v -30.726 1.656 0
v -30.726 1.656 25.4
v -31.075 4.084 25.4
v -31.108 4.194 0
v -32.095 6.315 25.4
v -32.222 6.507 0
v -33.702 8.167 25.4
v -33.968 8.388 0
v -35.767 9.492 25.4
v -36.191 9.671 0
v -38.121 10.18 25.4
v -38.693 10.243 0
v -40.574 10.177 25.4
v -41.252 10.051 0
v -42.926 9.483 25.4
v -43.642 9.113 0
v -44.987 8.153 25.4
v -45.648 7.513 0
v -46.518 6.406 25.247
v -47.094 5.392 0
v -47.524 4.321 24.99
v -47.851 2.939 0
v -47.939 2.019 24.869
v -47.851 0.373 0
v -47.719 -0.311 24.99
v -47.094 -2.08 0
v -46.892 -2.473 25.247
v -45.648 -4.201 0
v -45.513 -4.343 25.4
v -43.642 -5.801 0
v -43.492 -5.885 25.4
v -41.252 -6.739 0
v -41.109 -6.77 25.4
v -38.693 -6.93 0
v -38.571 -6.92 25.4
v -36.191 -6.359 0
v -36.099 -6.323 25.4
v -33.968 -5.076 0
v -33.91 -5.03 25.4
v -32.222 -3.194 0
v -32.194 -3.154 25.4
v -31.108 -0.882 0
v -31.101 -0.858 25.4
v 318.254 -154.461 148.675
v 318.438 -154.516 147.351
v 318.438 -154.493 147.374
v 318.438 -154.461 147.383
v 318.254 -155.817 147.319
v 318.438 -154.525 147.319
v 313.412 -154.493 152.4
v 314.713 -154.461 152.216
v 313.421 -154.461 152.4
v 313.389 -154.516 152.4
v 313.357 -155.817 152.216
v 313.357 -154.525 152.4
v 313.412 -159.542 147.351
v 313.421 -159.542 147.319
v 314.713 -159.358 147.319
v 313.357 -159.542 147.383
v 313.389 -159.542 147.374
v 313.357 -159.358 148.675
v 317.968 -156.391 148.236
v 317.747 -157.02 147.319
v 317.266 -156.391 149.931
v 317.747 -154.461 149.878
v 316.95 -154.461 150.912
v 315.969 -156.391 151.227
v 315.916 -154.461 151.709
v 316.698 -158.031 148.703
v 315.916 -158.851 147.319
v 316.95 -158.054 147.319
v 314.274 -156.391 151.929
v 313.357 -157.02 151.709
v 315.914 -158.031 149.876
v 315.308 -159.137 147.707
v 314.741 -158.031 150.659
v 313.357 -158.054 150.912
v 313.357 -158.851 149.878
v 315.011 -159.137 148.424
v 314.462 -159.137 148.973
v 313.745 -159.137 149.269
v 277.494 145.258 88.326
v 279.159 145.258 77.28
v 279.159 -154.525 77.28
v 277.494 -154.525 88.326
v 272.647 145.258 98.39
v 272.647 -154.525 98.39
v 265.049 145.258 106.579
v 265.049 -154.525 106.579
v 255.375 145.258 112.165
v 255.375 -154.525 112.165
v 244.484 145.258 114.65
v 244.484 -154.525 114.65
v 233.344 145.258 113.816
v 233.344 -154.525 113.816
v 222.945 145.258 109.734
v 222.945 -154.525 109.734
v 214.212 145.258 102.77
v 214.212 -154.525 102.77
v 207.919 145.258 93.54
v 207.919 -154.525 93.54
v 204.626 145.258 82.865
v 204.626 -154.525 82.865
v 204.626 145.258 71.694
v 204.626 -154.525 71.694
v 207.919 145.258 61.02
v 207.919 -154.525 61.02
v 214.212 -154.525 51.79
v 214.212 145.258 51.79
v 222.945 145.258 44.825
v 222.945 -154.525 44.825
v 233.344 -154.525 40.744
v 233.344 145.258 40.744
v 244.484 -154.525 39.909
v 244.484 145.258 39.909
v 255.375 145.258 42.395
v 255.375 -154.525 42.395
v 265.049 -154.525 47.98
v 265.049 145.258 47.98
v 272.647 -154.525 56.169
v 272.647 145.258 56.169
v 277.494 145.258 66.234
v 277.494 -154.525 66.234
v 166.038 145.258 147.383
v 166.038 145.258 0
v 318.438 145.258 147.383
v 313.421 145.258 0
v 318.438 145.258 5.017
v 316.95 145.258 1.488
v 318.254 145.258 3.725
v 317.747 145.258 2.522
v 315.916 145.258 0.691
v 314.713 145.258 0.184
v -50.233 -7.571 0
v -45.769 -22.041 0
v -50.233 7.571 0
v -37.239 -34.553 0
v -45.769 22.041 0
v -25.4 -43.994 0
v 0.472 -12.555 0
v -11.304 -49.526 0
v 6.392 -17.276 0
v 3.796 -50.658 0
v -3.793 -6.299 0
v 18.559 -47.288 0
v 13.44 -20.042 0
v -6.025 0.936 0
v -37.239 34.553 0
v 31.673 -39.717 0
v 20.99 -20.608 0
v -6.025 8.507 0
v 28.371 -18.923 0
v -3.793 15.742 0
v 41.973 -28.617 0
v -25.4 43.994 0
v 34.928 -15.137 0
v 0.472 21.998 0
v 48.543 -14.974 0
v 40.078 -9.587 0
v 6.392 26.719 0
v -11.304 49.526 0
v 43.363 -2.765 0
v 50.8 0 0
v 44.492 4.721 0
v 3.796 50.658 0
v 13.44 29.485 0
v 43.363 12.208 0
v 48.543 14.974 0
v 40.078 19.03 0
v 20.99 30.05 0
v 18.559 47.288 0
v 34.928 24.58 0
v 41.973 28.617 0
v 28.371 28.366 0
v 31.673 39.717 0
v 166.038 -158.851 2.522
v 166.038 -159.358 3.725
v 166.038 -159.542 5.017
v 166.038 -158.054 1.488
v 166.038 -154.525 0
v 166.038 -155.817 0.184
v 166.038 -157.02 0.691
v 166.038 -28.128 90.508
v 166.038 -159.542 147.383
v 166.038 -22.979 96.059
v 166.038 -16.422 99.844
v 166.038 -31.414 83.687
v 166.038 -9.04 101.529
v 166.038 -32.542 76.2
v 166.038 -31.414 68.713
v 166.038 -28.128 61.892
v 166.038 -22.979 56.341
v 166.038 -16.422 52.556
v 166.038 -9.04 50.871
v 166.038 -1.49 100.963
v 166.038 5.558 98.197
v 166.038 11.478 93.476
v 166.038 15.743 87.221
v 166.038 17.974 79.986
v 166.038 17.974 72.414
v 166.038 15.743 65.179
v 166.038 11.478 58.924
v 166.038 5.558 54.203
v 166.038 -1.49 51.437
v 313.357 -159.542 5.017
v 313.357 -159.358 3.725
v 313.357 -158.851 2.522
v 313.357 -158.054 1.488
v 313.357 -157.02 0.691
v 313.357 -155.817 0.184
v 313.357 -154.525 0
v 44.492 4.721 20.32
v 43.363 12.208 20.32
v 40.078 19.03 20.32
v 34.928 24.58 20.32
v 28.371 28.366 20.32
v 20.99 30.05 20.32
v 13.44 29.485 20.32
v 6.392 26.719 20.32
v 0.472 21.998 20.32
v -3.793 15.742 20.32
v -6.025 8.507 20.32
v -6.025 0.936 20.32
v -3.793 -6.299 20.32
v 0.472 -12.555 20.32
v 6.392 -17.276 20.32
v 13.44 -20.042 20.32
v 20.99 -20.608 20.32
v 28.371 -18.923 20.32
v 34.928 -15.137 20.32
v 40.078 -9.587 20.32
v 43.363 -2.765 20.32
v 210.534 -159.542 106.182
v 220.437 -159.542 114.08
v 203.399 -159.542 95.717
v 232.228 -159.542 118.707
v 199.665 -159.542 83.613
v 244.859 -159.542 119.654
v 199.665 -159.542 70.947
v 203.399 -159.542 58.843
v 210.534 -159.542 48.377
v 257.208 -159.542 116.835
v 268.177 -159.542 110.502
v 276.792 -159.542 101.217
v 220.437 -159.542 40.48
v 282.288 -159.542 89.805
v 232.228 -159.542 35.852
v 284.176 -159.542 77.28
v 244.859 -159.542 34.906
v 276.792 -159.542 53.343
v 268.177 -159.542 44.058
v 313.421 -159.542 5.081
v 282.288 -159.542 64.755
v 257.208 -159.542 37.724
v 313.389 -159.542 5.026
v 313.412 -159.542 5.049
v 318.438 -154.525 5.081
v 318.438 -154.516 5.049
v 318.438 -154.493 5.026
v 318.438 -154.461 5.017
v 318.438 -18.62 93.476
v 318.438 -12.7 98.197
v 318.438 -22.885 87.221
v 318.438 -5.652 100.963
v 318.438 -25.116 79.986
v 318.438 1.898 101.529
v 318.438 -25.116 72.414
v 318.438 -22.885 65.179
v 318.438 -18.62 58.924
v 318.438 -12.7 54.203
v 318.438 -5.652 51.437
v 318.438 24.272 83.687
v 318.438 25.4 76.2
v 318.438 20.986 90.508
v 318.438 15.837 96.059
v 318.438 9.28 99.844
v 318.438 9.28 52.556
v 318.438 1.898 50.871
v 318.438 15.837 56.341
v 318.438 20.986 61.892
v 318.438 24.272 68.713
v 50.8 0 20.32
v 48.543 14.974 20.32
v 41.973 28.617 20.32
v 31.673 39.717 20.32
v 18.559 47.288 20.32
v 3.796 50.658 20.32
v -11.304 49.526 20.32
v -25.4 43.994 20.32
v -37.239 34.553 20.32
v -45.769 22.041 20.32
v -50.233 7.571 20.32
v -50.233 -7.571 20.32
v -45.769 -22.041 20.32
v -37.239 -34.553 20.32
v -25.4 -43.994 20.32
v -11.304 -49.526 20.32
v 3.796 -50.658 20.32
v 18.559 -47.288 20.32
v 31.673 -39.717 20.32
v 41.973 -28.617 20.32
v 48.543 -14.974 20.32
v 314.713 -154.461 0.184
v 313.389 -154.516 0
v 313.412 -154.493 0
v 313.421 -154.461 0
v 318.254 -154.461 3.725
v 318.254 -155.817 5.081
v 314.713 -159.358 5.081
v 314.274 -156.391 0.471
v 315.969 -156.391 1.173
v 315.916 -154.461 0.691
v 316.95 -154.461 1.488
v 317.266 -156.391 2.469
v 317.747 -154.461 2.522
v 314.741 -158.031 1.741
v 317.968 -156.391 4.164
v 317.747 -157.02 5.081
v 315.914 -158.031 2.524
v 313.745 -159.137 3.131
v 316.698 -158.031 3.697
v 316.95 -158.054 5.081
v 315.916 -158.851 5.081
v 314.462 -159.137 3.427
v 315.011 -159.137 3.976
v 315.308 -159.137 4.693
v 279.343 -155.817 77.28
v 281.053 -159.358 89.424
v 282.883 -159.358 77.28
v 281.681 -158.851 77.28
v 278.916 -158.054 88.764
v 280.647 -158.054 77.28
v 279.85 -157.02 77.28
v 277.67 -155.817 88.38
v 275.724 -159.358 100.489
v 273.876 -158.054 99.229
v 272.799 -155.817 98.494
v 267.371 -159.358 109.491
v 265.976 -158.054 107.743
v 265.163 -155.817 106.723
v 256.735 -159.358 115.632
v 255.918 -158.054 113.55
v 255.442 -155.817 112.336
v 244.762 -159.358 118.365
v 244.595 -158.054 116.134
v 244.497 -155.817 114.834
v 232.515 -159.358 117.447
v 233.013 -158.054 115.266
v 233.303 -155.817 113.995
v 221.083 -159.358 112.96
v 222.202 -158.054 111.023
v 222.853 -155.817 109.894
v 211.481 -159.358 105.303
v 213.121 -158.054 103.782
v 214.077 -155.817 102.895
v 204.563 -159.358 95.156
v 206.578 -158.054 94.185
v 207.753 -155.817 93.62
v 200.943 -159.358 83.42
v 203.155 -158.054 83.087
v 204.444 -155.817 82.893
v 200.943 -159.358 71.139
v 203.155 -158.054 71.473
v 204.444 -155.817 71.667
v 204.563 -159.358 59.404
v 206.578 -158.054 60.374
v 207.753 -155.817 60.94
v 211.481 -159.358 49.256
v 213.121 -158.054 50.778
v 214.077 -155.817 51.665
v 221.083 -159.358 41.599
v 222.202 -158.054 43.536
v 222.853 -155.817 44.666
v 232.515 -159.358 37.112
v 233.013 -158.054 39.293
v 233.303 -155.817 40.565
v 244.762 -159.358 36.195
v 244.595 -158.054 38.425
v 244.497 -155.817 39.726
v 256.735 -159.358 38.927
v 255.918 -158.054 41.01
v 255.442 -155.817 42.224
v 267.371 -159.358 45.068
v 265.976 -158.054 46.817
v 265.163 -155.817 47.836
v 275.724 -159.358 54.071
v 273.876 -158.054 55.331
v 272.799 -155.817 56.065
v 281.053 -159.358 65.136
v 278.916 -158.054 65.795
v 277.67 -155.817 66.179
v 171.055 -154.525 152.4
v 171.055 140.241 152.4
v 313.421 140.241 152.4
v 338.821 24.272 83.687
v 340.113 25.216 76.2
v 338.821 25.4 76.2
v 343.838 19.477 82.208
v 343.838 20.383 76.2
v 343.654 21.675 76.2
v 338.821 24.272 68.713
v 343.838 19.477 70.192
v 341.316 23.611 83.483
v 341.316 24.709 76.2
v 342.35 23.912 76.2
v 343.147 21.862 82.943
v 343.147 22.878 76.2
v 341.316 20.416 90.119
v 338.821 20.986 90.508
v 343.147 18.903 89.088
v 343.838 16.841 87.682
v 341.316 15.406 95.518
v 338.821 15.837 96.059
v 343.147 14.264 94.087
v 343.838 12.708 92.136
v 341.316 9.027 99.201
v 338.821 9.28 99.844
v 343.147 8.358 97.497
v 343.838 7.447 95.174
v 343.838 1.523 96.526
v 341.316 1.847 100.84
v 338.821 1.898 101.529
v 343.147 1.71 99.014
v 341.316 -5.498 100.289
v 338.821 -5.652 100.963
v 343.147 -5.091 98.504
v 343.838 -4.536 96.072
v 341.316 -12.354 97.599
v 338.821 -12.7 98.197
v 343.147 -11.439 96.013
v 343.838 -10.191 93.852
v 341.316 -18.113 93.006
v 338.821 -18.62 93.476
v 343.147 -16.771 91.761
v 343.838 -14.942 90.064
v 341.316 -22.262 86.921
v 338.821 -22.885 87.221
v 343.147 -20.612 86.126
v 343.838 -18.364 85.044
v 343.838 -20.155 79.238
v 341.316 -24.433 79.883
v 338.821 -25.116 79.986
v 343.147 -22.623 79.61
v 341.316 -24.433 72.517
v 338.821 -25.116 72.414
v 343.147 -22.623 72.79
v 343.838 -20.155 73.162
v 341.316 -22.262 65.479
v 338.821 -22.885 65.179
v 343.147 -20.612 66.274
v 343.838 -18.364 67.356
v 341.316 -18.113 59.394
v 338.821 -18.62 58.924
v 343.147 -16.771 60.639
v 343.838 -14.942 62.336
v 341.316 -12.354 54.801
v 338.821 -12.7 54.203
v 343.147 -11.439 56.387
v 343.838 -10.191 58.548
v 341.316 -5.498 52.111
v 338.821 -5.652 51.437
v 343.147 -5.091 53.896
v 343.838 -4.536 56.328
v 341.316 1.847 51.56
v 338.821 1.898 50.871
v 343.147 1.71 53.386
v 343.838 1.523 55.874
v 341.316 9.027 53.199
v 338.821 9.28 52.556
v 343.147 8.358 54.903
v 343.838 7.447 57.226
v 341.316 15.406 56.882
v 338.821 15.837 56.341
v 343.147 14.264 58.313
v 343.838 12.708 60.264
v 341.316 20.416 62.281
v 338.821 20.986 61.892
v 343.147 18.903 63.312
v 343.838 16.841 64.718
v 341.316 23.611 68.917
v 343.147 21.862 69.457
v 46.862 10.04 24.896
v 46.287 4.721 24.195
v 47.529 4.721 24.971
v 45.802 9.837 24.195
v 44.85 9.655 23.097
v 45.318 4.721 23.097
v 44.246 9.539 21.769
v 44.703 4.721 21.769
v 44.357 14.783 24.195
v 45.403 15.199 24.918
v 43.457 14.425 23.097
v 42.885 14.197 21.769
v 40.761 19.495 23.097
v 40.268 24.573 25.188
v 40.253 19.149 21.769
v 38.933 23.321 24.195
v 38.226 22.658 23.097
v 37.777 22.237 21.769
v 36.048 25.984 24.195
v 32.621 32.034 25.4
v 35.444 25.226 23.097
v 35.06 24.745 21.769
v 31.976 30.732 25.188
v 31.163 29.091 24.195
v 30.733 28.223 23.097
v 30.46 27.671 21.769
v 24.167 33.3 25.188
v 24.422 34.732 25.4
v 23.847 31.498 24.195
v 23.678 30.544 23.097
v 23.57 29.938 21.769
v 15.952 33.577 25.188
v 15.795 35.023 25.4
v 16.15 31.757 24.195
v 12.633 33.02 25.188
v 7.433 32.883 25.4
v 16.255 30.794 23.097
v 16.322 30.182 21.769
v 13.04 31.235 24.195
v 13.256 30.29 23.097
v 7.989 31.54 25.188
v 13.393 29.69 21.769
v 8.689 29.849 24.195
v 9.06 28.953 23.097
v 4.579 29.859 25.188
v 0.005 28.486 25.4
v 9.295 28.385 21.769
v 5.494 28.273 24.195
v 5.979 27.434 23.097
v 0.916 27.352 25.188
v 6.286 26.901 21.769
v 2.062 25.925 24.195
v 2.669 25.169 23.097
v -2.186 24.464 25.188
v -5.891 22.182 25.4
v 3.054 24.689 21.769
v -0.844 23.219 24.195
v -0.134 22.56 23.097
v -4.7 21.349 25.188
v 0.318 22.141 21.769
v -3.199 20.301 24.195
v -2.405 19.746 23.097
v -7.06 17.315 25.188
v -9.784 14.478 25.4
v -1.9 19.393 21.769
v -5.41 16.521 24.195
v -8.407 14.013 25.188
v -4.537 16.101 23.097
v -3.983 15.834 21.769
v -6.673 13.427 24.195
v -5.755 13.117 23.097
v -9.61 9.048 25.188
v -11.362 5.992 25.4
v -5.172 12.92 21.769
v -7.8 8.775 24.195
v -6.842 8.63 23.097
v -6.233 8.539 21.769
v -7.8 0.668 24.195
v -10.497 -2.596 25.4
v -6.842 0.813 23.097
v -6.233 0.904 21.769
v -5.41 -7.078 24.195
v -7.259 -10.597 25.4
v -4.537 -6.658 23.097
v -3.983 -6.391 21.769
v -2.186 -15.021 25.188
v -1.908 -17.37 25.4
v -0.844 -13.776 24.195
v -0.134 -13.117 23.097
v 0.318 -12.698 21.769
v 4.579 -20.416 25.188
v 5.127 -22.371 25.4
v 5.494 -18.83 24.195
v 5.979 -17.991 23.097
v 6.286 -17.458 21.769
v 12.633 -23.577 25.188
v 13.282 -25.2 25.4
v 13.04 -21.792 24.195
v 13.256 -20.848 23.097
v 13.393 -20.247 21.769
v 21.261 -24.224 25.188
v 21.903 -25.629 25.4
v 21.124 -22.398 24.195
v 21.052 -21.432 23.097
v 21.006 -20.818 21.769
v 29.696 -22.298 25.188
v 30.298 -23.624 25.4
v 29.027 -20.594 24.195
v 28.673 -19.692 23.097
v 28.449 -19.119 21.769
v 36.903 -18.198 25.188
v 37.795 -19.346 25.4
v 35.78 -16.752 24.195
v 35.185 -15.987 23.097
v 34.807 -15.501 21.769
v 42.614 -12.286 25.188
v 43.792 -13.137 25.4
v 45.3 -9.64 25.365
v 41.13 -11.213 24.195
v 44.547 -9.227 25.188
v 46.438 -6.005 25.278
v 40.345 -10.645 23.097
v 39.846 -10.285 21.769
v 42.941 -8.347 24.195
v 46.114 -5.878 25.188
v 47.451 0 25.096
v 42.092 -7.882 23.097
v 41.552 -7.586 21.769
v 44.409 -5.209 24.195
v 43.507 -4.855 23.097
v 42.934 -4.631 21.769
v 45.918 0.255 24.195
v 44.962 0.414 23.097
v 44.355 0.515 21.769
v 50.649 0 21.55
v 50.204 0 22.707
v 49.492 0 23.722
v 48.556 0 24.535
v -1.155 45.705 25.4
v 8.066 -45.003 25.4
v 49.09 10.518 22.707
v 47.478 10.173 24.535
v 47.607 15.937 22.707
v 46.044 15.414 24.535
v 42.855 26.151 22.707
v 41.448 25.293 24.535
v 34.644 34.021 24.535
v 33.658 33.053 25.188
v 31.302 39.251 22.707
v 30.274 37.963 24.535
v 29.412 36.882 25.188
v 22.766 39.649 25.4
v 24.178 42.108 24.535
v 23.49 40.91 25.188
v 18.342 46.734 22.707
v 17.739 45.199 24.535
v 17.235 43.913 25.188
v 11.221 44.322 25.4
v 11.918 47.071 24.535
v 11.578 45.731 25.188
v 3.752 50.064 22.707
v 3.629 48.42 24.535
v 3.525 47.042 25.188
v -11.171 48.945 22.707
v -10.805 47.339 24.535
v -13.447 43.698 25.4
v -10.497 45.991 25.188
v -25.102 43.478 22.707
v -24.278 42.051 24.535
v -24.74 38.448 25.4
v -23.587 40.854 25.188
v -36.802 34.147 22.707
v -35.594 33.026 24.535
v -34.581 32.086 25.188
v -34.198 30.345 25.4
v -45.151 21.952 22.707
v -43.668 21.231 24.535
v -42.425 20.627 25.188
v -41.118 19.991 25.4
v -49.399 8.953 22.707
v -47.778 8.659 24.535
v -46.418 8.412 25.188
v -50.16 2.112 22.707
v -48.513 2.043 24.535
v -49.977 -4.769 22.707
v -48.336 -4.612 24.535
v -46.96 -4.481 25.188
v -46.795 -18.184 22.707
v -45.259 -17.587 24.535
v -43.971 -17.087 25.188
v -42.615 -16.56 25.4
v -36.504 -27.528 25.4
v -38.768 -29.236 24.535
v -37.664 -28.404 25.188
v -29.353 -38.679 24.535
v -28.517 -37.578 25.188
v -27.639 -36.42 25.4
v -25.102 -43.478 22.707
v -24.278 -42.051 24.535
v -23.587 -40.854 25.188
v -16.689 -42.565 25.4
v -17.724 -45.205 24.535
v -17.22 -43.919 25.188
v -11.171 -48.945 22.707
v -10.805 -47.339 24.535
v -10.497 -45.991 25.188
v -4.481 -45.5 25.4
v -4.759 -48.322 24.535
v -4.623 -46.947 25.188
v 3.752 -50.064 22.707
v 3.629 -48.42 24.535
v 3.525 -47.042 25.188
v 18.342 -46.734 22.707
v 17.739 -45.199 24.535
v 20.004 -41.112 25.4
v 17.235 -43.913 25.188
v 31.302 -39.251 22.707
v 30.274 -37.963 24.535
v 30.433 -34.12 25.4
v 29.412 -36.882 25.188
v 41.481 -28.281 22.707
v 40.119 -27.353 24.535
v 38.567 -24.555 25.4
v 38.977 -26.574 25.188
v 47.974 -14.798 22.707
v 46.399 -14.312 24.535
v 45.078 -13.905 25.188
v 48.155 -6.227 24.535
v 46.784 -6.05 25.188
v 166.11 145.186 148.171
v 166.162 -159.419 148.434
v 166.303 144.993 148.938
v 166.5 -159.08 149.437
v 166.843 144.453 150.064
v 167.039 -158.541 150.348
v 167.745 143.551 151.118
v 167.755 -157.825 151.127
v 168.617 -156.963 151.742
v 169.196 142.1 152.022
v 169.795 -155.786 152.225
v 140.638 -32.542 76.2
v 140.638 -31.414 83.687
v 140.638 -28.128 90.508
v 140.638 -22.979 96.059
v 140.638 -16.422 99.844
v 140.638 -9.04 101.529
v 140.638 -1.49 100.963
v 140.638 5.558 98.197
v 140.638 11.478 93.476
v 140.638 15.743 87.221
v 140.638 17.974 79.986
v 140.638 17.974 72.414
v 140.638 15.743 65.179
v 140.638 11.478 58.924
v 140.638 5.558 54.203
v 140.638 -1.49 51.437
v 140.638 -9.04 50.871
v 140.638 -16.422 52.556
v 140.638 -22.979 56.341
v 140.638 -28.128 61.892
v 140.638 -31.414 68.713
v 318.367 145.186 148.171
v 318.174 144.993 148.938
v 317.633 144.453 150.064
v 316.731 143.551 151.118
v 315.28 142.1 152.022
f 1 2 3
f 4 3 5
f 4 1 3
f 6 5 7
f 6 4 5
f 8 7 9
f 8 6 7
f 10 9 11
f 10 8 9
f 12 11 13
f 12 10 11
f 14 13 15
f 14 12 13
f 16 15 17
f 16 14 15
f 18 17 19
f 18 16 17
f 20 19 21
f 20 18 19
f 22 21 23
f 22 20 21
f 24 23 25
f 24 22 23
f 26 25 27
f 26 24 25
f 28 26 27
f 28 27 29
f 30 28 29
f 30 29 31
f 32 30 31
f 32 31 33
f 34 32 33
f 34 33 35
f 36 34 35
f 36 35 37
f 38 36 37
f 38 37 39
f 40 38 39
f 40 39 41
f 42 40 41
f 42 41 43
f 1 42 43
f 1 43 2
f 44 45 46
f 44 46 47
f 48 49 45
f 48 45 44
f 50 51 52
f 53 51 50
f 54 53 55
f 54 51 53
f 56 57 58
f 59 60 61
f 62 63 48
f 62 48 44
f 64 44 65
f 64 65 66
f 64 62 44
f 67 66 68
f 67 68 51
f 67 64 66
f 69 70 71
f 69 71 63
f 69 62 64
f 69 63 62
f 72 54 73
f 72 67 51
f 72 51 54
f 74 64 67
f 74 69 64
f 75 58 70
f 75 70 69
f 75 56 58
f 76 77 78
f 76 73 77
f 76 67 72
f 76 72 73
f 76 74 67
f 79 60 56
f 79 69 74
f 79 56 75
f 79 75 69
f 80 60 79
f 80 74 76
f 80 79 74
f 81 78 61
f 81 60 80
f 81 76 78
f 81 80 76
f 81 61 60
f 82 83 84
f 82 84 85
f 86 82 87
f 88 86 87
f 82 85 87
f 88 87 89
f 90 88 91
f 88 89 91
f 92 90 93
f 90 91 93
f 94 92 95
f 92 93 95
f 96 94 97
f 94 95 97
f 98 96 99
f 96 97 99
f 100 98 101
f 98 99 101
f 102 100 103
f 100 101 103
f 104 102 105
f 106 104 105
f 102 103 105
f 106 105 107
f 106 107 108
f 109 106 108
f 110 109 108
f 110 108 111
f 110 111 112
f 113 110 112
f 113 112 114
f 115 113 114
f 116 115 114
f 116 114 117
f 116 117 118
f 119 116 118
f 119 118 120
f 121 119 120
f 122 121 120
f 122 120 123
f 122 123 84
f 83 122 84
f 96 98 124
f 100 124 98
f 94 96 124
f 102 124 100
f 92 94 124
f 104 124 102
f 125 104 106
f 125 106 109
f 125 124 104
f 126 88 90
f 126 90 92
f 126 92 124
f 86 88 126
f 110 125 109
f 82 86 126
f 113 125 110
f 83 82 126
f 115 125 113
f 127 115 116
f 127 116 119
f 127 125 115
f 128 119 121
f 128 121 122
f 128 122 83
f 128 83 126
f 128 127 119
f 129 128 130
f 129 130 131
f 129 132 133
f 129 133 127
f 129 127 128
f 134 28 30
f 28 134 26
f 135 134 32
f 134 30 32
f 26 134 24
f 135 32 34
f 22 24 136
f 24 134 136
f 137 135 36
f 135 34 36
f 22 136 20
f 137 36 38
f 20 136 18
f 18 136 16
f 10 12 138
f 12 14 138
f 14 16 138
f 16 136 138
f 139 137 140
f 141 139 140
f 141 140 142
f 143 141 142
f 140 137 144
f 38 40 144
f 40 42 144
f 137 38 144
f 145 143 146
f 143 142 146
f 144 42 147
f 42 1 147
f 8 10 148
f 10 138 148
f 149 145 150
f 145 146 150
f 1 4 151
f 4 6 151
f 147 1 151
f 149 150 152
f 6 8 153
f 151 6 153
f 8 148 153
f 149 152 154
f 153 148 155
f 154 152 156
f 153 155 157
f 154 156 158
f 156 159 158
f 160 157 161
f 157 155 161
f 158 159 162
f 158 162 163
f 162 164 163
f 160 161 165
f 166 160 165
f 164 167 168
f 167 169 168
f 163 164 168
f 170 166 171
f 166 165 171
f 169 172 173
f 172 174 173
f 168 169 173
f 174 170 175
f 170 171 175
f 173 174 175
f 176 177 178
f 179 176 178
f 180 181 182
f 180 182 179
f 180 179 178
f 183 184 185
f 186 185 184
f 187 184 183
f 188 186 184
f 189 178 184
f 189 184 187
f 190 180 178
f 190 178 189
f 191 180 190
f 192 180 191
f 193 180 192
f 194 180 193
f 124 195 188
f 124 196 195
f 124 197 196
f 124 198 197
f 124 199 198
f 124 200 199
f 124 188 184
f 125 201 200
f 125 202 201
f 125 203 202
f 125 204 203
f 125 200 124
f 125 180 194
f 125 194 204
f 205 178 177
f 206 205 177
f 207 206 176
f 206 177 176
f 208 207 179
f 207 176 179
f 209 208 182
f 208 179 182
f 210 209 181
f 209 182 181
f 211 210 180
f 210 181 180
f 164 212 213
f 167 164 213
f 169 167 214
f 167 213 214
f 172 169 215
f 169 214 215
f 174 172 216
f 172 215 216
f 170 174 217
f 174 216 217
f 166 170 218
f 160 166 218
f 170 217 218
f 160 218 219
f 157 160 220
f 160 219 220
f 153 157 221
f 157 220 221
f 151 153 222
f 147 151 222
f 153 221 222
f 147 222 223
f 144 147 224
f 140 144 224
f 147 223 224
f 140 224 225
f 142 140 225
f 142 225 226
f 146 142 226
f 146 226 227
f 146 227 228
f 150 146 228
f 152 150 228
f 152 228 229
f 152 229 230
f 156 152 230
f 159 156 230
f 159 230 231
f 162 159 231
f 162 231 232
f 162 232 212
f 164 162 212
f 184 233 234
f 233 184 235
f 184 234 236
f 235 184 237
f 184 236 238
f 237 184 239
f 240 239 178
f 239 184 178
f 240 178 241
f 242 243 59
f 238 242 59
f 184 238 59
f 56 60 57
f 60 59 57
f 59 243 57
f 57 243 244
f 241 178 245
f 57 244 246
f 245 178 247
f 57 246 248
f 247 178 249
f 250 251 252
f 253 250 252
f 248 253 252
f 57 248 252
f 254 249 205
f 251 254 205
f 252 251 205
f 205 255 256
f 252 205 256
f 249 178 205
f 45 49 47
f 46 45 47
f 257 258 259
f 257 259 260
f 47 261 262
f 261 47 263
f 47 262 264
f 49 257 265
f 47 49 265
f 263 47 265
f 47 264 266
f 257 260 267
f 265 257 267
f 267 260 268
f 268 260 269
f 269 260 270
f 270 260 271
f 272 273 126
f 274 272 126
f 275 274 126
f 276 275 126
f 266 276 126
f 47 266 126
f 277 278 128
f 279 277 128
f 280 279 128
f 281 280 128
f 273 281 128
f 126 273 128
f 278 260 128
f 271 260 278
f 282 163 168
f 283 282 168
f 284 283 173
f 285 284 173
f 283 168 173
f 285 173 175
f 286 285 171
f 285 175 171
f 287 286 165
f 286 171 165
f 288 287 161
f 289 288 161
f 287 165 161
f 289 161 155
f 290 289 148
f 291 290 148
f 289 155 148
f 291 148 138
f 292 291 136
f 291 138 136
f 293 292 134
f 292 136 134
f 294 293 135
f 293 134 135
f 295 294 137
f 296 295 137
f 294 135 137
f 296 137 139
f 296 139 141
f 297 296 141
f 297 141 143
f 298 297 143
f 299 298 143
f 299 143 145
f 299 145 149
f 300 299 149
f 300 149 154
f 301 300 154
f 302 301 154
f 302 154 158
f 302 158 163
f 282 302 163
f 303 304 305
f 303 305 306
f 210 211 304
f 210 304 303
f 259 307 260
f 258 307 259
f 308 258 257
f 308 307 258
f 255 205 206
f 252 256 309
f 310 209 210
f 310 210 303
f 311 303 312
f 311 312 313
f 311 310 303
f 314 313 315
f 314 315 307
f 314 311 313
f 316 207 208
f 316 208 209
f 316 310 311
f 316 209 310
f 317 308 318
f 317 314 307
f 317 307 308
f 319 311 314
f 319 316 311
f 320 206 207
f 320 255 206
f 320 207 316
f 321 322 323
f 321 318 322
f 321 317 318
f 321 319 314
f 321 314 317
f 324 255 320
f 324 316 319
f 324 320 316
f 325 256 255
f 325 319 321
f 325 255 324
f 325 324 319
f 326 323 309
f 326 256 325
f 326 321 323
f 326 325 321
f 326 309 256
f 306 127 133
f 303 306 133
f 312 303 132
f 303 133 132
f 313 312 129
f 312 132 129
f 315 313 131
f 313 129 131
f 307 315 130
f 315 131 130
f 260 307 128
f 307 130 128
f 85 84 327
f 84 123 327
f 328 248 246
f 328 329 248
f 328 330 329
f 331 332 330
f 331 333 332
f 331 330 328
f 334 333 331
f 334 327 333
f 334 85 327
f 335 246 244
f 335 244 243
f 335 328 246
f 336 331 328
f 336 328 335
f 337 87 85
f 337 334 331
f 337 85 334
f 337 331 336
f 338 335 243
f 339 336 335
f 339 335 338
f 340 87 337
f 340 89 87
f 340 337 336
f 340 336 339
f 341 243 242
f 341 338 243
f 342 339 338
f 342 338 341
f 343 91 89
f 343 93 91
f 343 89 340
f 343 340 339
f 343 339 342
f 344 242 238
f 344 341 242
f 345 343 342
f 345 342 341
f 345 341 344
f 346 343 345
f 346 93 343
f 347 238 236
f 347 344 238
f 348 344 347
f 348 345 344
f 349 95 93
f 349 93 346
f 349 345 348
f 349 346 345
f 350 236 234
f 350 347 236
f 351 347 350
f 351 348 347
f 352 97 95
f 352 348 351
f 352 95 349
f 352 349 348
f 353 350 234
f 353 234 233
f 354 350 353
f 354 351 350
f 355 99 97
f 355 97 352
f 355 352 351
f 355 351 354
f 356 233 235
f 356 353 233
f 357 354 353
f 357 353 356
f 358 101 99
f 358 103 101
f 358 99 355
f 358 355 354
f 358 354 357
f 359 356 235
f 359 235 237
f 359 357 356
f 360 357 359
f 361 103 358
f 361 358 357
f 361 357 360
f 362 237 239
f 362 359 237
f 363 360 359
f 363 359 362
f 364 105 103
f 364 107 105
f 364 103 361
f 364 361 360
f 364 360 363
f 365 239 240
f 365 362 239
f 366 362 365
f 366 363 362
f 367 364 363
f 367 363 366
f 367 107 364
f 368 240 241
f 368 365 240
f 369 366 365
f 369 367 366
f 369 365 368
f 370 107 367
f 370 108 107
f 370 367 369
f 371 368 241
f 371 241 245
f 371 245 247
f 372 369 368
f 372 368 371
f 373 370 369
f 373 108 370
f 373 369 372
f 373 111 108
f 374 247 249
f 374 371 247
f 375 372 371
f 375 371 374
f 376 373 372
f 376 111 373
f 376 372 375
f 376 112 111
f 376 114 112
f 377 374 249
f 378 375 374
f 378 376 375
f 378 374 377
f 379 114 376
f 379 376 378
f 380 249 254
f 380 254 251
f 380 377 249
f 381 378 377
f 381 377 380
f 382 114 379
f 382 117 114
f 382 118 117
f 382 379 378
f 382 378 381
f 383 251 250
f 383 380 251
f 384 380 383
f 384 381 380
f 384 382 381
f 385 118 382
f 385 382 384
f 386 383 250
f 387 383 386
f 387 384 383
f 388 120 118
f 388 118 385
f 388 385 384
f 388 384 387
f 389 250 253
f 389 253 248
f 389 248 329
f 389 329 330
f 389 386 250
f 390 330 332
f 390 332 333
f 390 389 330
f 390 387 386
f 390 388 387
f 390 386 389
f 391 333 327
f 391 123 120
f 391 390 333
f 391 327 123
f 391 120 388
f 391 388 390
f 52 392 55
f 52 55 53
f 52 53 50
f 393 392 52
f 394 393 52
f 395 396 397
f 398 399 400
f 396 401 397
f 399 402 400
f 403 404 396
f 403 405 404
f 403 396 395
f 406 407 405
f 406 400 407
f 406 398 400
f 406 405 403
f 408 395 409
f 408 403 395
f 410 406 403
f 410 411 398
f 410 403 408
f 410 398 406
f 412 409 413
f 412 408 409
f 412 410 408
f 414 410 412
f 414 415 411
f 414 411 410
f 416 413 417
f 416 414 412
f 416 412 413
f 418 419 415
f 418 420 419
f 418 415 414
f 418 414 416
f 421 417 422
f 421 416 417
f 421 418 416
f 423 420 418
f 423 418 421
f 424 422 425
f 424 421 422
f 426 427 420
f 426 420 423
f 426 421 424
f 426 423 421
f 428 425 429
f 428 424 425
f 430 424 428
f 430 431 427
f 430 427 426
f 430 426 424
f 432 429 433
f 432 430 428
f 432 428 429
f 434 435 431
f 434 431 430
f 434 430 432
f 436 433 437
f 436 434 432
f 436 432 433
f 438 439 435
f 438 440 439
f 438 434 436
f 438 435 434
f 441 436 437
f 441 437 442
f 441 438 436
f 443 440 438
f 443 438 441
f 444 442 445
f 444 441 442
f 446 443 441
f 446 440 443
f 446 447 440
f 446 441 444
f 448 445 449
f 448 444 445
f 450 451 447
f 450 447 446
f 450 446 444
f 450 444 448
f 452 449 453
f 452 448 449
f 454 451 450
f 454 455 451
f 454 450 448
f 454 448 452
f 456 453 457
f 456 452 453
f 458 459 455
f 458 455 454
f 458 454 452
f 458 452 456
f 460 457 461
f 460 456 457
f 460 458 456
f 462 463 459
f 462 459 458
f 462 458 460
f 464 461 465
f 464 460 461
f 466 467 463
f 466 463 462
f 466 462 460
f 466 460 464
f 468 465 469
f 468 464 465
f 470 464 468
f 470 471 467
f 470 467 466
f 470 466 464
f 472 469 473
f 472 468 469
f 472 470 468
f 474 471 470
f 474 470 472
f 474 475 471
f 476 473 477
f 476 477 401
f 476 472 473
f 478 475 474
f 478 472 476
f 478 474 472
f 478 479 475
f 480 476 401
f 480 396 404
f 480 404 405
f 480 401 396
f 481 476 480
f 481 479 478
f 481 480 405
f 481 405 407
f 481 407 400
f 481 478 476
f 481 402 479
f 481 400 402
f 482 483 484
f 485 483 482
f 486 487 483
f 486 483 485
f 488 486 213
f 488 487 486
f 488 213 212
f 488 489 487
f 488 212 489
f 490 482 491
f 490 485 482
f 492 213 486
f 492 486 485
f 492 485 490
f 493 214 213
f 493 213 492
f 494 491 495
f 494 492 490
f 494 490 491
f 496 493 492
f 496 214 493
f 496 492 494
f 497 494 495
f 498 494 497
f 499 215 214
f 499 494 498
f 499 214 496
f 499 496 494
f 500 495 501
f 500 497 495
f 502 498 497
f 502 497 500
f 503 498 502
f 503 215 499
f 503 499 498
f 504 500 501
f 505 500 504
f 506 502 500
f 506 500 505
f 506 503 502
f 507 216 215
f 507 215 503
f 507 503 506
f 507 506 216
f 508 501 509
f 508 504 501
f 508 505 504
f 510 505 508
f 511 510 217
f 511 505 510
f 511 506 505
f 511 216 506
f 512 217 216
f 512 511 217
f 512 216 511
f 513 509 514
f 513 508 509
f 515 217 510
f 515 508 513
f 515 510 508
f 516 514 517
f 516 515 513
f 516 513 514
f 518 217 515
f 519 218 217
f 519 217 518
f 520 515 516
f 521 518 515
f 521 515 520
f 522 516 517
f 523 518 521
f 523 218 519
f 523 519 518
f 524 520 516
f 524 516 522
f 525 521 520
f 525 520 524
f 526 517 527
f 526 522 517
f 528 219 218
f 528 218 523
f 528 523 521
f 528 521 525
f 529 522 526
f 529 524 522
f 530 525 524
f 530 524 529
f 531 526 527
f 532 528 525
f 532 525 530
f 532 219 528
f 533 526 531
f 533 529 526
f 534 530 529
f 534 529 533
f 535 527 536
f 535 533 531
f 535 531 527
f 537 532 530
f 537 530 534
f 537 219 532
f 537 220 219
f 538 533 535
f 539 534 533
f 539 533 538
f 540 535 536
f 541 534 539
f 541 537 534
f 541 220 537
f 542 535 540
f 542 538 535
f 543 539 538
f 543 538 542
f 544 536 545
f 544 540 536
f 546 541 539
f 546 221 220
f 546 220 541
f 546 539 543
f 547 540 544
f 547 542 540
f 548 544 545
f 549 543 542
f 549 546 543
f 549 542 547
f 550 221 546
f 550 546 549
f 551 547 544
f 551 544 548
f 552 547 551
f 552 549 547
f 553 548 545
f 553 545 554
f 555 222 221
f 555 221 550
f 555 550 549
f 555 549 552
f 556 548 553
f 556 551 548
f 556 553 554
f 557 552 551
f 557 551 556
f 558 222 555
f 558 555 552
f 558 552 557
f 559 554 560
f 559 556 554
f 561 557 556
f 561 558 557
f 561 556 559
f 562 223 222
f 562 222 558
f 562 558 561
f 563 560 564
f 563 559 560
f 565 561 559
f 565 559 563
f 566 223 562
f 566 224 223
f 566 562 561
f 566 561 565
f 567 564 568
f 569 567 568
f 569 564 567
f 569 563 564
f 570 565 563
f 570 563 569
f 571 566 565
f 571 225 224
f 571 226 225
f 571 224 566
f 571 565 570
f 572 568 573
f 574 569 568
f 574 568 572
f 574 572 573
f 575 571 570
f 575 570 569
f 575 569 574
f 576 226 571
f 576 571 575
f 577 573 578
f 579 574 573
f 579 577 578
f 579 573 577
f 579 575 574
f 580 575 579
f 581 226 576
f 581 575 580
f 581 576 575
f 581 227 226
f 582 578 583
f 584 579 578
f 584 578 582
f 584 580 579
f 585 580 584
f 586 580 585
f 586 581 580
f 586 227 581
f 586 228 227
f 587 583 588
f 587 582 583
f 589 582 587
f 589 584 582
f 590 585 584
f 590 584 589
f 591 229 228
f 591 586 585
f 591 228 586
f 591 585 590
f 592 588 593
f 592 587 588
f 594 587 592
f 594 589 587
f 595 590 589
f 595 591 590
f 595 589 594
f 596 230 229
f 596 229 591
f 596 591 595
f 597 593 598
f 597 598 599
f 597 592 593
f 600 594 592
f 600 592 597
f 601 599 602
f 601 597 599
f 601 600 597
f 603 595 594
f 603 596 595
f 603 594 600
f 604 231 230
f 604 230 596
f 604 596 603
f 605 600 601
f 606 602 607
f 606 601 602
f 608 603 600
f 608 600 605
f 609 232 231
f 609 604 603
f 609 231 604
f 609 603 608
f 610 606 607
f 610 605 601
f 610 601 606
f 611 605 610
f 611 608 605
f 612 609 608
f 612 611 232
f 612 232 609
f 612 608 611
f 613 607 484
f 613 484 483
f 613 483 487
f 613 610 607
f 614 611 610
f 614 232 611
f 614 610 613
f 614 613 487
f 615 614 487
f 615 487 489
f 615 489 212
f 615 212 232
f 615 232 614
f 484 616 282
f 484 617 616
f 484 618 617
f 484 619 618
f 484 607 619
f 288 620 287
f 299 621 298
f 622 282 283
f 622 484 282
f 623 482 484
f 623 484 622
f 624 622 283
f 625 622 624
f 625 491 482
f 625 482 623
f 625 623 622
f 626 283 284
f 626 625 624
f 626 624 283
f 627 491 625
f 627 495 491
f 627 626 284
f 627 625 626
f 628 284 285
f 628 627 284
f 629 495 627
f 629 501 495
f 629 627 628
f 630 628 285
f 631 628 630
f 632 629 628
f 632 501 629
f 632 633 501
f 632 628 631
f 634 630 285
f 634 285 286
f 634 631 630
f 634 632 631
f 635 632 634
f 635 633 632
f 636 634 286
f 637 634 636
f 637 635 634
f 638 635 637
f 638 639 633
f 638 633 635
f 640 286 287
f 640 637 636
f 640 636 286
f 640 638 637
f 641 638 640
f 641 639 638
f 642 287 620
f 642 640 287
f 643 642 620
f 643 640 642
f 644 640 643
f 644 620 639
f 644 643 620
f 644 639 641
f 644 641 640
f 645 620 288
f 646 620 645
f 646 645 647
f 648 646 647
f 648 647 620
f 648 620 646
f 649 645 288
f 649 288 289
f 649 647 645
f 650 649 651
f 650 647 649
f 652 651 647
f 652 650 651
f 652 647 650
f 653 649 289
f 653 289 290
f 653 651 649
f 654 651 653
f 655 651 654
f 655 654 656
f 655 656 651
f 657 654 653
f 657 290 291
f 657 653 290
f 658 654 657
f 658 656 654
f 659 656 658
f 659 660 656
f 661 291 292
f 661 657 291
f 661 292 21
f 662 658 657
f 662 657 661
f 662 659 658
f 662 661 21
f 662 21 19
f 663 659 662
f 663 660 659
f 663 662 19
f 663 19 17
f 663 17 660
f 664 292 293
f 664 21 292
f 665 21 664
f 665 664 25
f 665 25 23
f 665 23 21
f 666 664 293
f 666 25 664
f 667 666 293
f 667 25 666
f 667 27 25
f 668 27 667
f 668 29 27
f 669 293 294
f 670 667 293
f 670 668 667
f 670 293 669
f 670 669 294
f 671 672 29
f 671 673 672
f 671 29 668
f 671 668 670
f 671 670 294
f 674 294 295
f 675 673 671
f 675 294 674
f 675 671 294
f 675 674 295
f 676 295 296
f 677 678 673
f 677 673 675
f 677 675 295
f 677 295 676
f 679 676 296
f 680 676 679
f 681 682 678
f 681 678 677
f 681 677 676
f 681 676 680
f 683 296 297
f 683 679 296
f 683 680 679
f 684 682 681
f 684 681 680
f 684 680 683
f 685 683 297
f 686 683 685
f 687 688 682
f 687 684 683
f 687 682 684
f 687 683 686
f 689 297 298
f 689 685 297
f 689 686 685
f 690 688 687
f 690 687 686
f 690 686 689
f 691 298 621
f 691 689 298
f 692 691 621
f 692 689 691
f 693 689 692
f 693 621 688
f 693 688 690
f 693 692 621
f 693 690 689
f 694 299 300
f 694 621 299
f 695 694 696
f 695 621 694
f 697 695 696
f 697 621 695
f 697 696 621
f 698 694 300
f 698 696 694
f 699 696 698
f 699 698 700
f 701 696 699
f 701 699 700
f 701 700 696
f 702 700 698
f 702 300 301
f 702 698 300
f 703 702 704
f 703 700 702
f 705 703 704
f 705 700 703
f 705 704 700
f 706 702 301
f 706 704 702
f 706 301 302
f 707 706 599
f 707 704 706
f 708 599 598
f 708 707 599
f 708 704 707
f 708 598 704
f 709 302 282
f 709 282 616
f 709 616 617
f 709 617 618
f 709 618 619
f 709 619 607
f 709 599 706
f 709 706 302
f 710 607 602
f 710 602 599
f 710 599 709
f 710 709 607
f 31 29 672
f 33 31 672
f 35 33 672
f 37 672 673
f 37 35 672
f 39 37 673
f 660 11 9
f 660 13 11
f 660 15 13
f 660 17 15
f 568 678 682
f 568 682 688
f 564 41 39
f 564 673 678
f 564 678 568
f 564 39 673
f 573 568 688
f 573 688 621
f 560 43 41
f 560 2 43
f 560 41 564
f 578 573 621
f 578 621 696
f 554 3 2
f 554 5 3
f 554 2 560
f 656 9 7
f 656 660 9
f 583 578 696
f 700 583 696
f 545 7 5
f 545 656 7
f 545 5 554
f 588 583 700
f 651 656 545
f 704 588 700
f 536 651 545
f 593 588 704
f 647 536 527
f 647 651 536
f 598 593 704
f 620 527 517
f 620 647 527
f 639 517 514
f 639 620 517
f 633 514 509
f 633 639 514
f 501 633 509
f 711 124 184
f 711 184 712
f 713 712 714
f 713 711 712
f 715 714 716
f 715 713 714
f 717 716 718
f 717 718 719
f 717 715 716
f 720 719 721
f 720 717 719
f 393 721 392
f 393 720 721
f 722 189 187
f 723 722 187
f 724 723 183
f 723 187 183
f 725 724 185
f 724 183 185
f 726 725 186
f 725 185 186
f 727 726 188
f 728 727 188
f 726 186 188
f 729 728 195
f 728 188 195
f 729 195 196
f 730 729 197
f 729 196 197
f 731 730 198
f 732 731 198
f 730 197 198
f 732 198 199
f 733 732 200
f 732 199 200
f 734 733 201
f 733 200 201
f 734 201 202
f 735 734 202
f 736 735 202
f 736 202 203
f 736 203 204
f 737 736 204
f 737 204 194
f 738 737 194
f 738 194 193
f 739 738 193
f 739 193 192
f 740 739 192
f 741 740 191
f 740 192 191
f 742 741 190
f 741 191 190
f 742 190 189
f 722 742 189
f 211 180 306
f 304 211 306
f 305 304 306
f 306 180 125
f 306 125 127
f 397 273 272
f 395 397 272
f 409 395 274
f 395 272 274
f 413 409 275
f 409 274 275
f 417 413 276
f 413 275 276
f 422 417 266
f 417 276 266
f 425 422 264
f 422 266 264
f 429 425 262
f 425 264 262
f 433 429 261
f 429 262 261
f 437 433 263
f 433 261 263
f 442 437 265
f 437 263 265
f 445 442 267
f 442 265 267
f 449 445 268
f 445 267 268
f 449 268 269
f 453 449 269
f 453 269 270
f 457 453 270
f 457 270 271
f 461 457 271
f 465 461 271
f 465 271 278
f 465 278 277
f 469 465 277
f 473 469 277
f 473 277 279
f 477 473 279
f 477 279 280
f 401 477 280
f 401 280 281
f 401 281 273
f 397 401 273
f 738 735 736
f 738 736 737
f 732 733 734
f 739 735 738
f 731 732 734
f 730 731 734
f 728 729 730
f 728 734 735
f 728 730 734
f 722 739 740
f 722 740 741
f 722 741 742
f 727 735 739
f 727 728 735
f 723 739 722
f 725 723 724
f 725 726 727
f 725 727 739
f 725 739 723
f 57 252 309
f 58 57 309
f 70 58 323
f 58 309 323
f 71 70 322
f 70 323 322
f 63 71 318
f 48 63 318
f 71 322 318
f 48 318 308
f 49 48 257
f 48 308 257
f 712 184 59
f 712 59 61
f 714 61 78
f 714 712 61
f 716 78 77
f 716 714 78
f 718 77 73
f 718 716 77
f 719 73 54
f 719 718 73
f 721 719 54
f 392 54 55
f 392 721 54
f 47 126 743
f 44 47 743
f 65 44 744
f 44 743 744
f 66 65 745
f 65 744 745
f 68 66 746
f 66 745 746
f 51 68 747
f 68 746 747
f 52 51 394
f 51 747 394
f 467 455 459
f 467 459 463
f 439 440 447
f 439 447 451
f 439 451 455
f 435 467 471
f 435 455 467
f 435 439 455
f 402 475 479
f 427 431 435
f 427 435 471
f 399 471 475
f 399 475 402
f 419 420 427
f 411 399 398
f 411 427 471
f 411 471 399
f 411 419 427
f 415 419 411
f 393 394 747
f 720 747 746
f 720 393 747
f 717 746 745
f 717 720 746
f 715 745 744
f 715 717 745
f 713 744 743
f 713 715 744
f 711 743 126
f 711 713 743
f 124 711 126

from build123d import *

# Parameters (mm, degrees)
F0_R            = 50.8
F0_R_2          = 8.6106
F1_DEPTH        = 25.4
F2_W            = 152.4
F2_H            = 304.8
F3_DEPTH        = 152.4
F5_DEPTH        = 304.8
F6_R            = 25.4
F7_DEPTH        = 25.4
F8_R            = 25.4
F9_DEPTH        = 25.4
F10_R           = 37.4754940494
F11_DEPTH       = 1270
F12_DEPTH       = 25.4
F13_DEPTH       = 25.4
F14_R           = 25.4
F15_DEPTH       = 25.4
F16_2_T1_DEPTH  = 160.0214485675
F16_2_T3_DEPTH  = 177.8048285058
F16_2_T5_DEPTH  = 330.2048285058
F16_2_T7_DEPTH  = 312.4214485675
F16_2_T9_DEPTH  = 142.2380686292
F16_2_S13_W     = 5.5895022539
F16_2_S13_H     = 5.5895022539
F16_2_T14_DEPTH = 5.589502254
F16_2_S19_W     = 5.5895022539
F16_2_S19_H     = 5.5895022539
F16_2_T20_DEPTH = 5.589502254


# Not quite as in the source:
# - a fillet or chamfer that OpenCascade refuses, or shapes differently, is made with other operations: its cross-section is extruded or revolved along the edge and cut away or added


with BuildPart() as f1:
    # F0 (on Top) → F1 (new body)
    with BuildSketch(Plane.XY):
        Circle(F0_R)
        with Locations((-39.3364430946, 1.6560875433)):
            Circle(F0_R_2, mode=Mode.SUBTRACT)
    extrude(amount=F1_DEPTH)

    # F14 (on face) → F15 (cut)
    with BuildSketch(Plane.XY.offset(25.4)):
        with Locations((19.0917998552, 4.7214571387)):
            Circle(F14_R)
    extrude(amount=-F15_DEPTH, mode=Mode.SUBTRACT)

    # F16: fillet of radius 5.08 on 2 edges, made by hand

    # F16_s1 → F16_t2 (revolve, cut)
    with BuildSketch(Plane.XZ.offset(-4.7214571387)):
        with BuildLine():
            ThreePointArc((49.5717998552, 25.4), (45.9796974068, 23.9121024484), (44.4917998552, 20.32))
            Line((44.4917998552, 20.32), (44.4917998552, 25.4))
            Line((44.4917998552, 25.4), (49.5717998552, 25.4))
        make_face()
    revolve(axis=Axis((19.0917998552, 4.7214571387, 25.4), (0, 0, 1)), mode=Mode.SUBTRACT)

    # F16_s3 → F16_t4 (revolve, cut)
    with BuildSketch(Plane.XZ):
        with BuildLine():
            ThreePointArc((50.8, 20.32), (49.3121024484, 23.9121024484), (45.72, 25.4))
            Line((45.72, 25.4), (50.8, 25.4))
            Line((50.8, 25.4), (50.8, 20.32))
        make_face()
    revolve(axis=Axis((0, 0, 25.4), (0, 0, 1)), mode=Mode.SUBTRACT)


with BuildPart() as f3:
    # F2 (on Top) → F3 (new body)
    with BuildSketch(Plane.XY):
        with Locations((242.2382127733, -7.1419849992)):
            Rectangle(F2_W, F2_H)
    extrude(amount=F3_DEPTH)

    # F4 (on face) → F5 (join)
    with BuildSketch(Plane.XZ.offset(159.5419849992)):
        with BuildLine():
            ThreePointArc((242.2382127733, 0), (296.1197494997, 22.3184632736), (318.4382127733, 76.2))
            ThreePointArc((318.4382127733, 76.2), (296.1197494997, 130.0815367264), (242.2382127733, 152.4))
            ThreePointArc((242.2382127733, 152.4), (188.3566760469, 130.0815367264), (166.0382127733, 76.2))
            ThreePointArc((166.0382127733, 76.2), (188.3566760469, 22.3184632736), (242.2382127733, 0))
        make_face()
    extrude(amount=-F5_DEPTH)

    # F6 (on face) → F7 (join)
    with BuildSketch(Plane.YZ.offset(318.4382127733)):
        with Locations((0, 76.2)):
            Circle(F6_R)
    extrude(amount=F7_DEPTH)

    # F8 (on face) → F9 (join)
    with BuildSketch(Plane(origin=(166.0382127733, 0, 0), x_dir=(0, -1, 0), z_dir=(-1, 0, 0))):
        with Locations((7.1419849992, 76.2)):
            Circle(F8_R)
    extrude(amount=F9_DEPTH)

    # F10 (on face) → F11 (cut)
    with BuildSketch(Plane.XZ.offset(159.5419849992)):
        with Locations((241.6832000017, 77.279753983)):
            Circle(F10_R)
    extrude(amount=-F11_DEPTH, mode=Mode.SUBTRACT)

    # F8 (on face) + F6 (on face) → F12 (join)
    with BuildSketch(Plane(origin=(166.0382127733, 0, 0), x_dir=(0, -1, 0), z_dir=(-1, 0, 0))):
        with Locations((7.1419849992, 76.2)):
            Circle(F8_R)
    with BuildSketch(Plane.YZ.offset(318.4382127733)):
        with Locations((0, 76.2)):
            Circle(F6_R)
    extrude(amount=-F12_DEPTH, dir=(-1, 0, 0))

    # F8 (on face) → F13 (join)
    with BuildSketch(Plane(origin=(166.0382127733, 0, 0), x_dir=(0, -1, 0), z_dir=(-1, 0, 0))):
        with Locations((7.1419849992, 76.2)):
            Circle(F8_R)
    extrude(amount=F13_DEPTH)

    # F16#2: fillet of radius 5.08 on 9 edges, made by hand

    # F16_2_s2 → F16_2_t1 (cut)
    with BuildSketch(Plane.YZ.offset(153.3357985204)):
        with BuildLine():
            ThreePointArc((-159.5423849992, 147.3190343146), (-158.0540874476, 150.9121024484), (-154.4610193138, 152.4004))
            Line((-154.4610193138, 152.4004), (-154.4610193138, 152.9085365685))
            ThreePointArc((-154.4610193138, 152.9085365685), (-157.0015021565, 152.9081365685), (-159.5419849992, 152.9081365685))
            Line((-159.5419849992, 152.9081365685), (-160.0501215677, 152.4))
            ThreePointArc((-160.0501215677, 152.4), (-160.0501215677, 149.8595171573), (-160.0505215677, 147.3190343146))
            Line((-160.0505215677, 147.3190343146), (-159.5423849992, 147.3190343146))
        make_face()
        with BuildLine():
            ThreePointArc((-159.5423849992, 5.0809656854), (-158.0540874476, 1.4878975516), (-154.4610193138, -0.0004))
            Line((-154.4610193138, -0.0004), (-154.4610193138, -0.5085365685))
            ThreePointArc((-154.4610193138, -0.5085365685), (-157.0015021565, -0.5081365685), (-159.5419849992, -0.5081365685))
            Line((-159.5419849992, -0.5081365685), (-160.0501215677, 0))
            ThreePointArc((-160.0501215677, 0), (-160.0501215677, 2.5404828427), (-160.0505215677, 5.0809656854))
            Line((-160.0505215677, 5.0809656854), (-159.5423849992, 5.0809656854))
        make_face()
    extrude(amount=F16_2_T1_DEPTH, mode=Mode.SUBTRACT)

    # F16_2_s4 → F16_2_t3 (cut)
    with BuildSketch(Plane.YZ.offset(153.3357985204)):
        with BuildLine():
            ThreePointArc((140.1770493154, 152.4004), (143.7701174492, 150.9121024484), (145.2584150008, 147.3190343146))
            Line((145.2584150008, 147.3190343146), (145.7665515694, 147.3190343146))
            ThreePointArc((145.7665515694, 147.3190343146), (145.7661515694, 149.8595171573), (145.7661515694, 152.4))
            Line((145.7661515694, 152.4), (145.2580150008, 152.9081365685))
            ThreePointArc((145.2580150008, 152.9081365685), (142.7175321581, 152.9081365685), (140.1770493154, 152.9085365685))
            Line((140.1770493154, 152.9085365685), (140.1770493154, 152.4004))
        make_face()
    extrude(amount=F16_2_T3_DEPTH, mode=Mode.SUBTRACT)

    # F16_2_s6 → F16_2_t5 (cut)
    with BuildSketch(Plane.XZ.offset(-157.9604292537)):
        with BuildLine():
            ThreePointArc((166.0378127733, 147.3190343146), (167.5261103249, 150.9121024484), (171.1191784587, 152.4004))
            Line((171.1191784587, 152.4004), (171.1191784587, 152.9085365685))
            ThreePointArc((171.1191784587, 152.9085365685), (168.578695616, 152.9081365685), (166.0382127733, 152.9081365685))
            Line((166.0382127733, 152.9081365685), (165.5300762047, 152.4))
            ThreePointArc((165.5300762047, 152.4), (165.5300762047, 149.8595171573), (165.5296762047, 147.3190343146))
            Line((165.5296762047, 147.3190343146), (166.0378127733, 147.3190343146))
        make_face()
    extrude(amount=F16_2_T5_DEPTH, mode=Mode.SUBTRACT)

    # F16_2_s8 → F16_2_t7 (cut)
    with BuildSketch(Plane.XZ.offset(-157.9604292537)):
        with BuildLine():
            ThreePointArc((318.4386127733, 147.3190343146), (316.9503152217, 150.9121024484), (313.3572470879, 152.4004))
            Line((313.3572470879, 152.4004), (313.3572470879, 152.9085365685))
            ThreePointArc((313.3572470879, 152.9085365685), (315.8977299306, 152.9081365685), (318.4382127733, 152.9081365685))
            Line((318.4382127733, 152.9081365685), (318.9463493418, 152.4))
            ThreePointArc((318.9463493418, 152.4), (318.9463493418, 149.8595171573), (318.9467493418, 147.3190343146))
            Line((318.9467493418, 147.3190343146), (318.4386127733, 147.3190343146))
        make_face()
        with BuildLine():
            ThreePointArc((313.3572470879, -0.0004), (316.9503152217, 1.4878975516), (318.4386127733, 5.0809656854))
            Line((318.4386127733, 5.0809656854), (318.9467493418, 5.0809656854))
            ThreePointArc((318.9467493418, 5.0809656854), (318.9463493418, 2.5404828427), (318.9463493418, 0))
            Line((318.9463493418, 0), (318.4382127733, -0.5081365685))
            ThreePointArc((318.4382127733, -0.5081365685), (315.8977299306, -0.5081365685), (313.3572470879, -0.5085365685))
            Line((313.3572470879, -0.5085365685), (313.3572470879, -0.0004))
        make_face()
    extrude(amount=F16_2_T7_DEPTH, mode=Mode.SUBTRACT)

    # F16_2_s10 → F16_2_t9 (cut)
    with BuildSketch(Plane.XY.offset(5.0809656854)):
        with BuildLine():
            ThreePointArc((313.3572470879, -159.5423849992), (316.9503152217, -158.0540874476), (318.4386127733, -154.4610193138))
            Line((318.4386127733, -154.4610193138), (318.9467493418, -154.4610193138))
            ThreePointArc((318.9467493418, -154.4610193138), (318.9463493418, -157.0015021565), (318.9463493418, -159.5419849992))
            Line((318.9463493418, -159.5419849992), (318.4382127733, -160.0501215677))
            ThreePointArc((318.4382127733, -160.0501215677), (315.8977299306, -160.0501215677), (313.3572470879, -160.0505215677))
            Line((313.3572470879, -160.0505215677), (313.3572470879, -159.5423849992))
        make_face()
    extrude(amount=F16_2_T9_DEPTH, mode=Mode.SUBTRACT)


with BuildPart() as f16_2_tool12:
    # F16_2_s13 → F16_2_t14 (new body)
    with BuildSketch(Plane.XZ.offset(154.4610193138)):
        with Locations((316.1519982148, 150.1137854416)):
            Rectangle(F16_2_S13_W, F16_2_S13_H)
    extrude(amount=F16_2_T14_DEPTH)

    # F16_2_s15 → F16_2_t16 (revolve, cut)
    with BuildSketch(Plane(origin=(313.3572470879, -154.4610193138, 147.3190343146), x_dir=(-0.7071067812, 0, -0.7071067812), z_dir=(-0.7071067812, 0, 0.7071067812))):
        with BuildLine():
            ThreePointArc((0, -5.0813656854), (5.0813656854, 0), (0, 5.0813656854))
            Line((0, 5.0813656854), (0, -5.0813656854))
        make_face()
    revolve(axis=Axis((313.3572470879, -154.4610193138, 147.3190343146), (0, -1, 0)), mode=Mode.SUBTRACT)


with BuildPart() as f3_1:
    add(f3.part)

    # F16_2_t11: cut F16_2_tool12
    add(f16_2_tool12.part, mode=Mode.SUBTRACT)


with BuildPart() as f16_2_tool18:
    # F16_2_s19 → F16_2_t20 (new body)
    with BuildSketch(Plane.XZ.offset(154.4610193138)):
        with Locations((316.1519982148, 2.2862145584)):
            Rectangle(F16_2_S19_W, F16_2_S19_H)
    extrude(amount=F16_2_T20_DEPTH)

    # F16_2_s21 → F16_2_t22 (revolve, cut)
    with BuildSketch(Plane(origin=(313.3572470879, -154.4610193138, 5.0809656854), x_dir=(-0.7071067812, 0, 0.7071067812), z_dir=(0.7071067812, 0, 0.7071067812))):
        with BuildLine():
            ThreePointArc((0, -5.0813656854), (5.0813656854, 0), (0, 5.0813656854))
            Line((0, 5.0813656854), (0, -5.0813656854))
        make_face()
    revolve(axis=Axis((313.3572470879, -154.4610193138, 5.0809656854), (0, -1, 0)), mode=Mode.SUBTRACT)


with BuildPart() as f3_2:
    add(f3_1.part)

    # F16_2_t17: cut F16_2_tool18
    add(f16_2_tool18.part, mode=Mode.SUBTRACT)

    # F16_2_s23 → F16_2_t24 (revolve, cut)
    with BuildSketch(Plane.XY.offset(76.2)):
        with BuildLine():
            ThreePointArc((338.7572470879, 25.4004), (342.3503152217, 23.9121024484), (343.8386127733, 20.3190343146))
            Line((343.8386127733, 20.3190343146), (344.3467493418, 20.3190343146))
            ThreePointArc((344.3467493418, 20.3190343146), (344.3463493418, 22.8595171573), (344.3463493418, 25.4))
            Line((344.3463493418, 25.4), (343.8382127733, 25.9081365685))
            ThreePointArc((343.8382127733, 25.9081365685), (341.2977299306, 25.9081365685), (338.7572470879, 25.9085365685))
            Line((338.7572470879, 25.9085365685), (338.7572470879, 25.4004))
        make_face()
    revolve(axis=Axis((343.8382127733, 0, 76.2), (1, 0, 0)), mode=Mode.SUBTRACT)

    # F16_2_s25 → F16_2_t26 (revolve, cut)
    with BuildSketch(Plane.XY.offset(77.279753983)):
        with BuildLine():
            ThreePointArc((284.2396597365, -159.5423849992), (280.6465916027, -158.0540874476), (279.1582940511, -154.4610193138))
            Line((279.1582940511, -154.4610193138), (278.6501574825, -154.4610193138))
            ThreePointArc((278.6501574825, -154.4610193138), (278.6505574825, -157.0015021565), (278.6505574825, -159.5419849992))
            Line((278.6505574825, -159.5419849992), (279.1586940511, -160.0501215677))
            ThreePointArc((279.1586940511, -160.0501215677), (281.6991768938, -160.0501215677), (284.2396597365, -160.0505215677))
            Line((284.2396597365, -160.0505215677), (284.2396597365, -159.5423849992))
        make_face()
    revolve(axis=Axis((241.6832000017, -159.5419849992, 77.279753983), (0, -1, 0)), mode=Mode.SUBTRACT)


solid = Compound([f1.part, f3_2.part])
